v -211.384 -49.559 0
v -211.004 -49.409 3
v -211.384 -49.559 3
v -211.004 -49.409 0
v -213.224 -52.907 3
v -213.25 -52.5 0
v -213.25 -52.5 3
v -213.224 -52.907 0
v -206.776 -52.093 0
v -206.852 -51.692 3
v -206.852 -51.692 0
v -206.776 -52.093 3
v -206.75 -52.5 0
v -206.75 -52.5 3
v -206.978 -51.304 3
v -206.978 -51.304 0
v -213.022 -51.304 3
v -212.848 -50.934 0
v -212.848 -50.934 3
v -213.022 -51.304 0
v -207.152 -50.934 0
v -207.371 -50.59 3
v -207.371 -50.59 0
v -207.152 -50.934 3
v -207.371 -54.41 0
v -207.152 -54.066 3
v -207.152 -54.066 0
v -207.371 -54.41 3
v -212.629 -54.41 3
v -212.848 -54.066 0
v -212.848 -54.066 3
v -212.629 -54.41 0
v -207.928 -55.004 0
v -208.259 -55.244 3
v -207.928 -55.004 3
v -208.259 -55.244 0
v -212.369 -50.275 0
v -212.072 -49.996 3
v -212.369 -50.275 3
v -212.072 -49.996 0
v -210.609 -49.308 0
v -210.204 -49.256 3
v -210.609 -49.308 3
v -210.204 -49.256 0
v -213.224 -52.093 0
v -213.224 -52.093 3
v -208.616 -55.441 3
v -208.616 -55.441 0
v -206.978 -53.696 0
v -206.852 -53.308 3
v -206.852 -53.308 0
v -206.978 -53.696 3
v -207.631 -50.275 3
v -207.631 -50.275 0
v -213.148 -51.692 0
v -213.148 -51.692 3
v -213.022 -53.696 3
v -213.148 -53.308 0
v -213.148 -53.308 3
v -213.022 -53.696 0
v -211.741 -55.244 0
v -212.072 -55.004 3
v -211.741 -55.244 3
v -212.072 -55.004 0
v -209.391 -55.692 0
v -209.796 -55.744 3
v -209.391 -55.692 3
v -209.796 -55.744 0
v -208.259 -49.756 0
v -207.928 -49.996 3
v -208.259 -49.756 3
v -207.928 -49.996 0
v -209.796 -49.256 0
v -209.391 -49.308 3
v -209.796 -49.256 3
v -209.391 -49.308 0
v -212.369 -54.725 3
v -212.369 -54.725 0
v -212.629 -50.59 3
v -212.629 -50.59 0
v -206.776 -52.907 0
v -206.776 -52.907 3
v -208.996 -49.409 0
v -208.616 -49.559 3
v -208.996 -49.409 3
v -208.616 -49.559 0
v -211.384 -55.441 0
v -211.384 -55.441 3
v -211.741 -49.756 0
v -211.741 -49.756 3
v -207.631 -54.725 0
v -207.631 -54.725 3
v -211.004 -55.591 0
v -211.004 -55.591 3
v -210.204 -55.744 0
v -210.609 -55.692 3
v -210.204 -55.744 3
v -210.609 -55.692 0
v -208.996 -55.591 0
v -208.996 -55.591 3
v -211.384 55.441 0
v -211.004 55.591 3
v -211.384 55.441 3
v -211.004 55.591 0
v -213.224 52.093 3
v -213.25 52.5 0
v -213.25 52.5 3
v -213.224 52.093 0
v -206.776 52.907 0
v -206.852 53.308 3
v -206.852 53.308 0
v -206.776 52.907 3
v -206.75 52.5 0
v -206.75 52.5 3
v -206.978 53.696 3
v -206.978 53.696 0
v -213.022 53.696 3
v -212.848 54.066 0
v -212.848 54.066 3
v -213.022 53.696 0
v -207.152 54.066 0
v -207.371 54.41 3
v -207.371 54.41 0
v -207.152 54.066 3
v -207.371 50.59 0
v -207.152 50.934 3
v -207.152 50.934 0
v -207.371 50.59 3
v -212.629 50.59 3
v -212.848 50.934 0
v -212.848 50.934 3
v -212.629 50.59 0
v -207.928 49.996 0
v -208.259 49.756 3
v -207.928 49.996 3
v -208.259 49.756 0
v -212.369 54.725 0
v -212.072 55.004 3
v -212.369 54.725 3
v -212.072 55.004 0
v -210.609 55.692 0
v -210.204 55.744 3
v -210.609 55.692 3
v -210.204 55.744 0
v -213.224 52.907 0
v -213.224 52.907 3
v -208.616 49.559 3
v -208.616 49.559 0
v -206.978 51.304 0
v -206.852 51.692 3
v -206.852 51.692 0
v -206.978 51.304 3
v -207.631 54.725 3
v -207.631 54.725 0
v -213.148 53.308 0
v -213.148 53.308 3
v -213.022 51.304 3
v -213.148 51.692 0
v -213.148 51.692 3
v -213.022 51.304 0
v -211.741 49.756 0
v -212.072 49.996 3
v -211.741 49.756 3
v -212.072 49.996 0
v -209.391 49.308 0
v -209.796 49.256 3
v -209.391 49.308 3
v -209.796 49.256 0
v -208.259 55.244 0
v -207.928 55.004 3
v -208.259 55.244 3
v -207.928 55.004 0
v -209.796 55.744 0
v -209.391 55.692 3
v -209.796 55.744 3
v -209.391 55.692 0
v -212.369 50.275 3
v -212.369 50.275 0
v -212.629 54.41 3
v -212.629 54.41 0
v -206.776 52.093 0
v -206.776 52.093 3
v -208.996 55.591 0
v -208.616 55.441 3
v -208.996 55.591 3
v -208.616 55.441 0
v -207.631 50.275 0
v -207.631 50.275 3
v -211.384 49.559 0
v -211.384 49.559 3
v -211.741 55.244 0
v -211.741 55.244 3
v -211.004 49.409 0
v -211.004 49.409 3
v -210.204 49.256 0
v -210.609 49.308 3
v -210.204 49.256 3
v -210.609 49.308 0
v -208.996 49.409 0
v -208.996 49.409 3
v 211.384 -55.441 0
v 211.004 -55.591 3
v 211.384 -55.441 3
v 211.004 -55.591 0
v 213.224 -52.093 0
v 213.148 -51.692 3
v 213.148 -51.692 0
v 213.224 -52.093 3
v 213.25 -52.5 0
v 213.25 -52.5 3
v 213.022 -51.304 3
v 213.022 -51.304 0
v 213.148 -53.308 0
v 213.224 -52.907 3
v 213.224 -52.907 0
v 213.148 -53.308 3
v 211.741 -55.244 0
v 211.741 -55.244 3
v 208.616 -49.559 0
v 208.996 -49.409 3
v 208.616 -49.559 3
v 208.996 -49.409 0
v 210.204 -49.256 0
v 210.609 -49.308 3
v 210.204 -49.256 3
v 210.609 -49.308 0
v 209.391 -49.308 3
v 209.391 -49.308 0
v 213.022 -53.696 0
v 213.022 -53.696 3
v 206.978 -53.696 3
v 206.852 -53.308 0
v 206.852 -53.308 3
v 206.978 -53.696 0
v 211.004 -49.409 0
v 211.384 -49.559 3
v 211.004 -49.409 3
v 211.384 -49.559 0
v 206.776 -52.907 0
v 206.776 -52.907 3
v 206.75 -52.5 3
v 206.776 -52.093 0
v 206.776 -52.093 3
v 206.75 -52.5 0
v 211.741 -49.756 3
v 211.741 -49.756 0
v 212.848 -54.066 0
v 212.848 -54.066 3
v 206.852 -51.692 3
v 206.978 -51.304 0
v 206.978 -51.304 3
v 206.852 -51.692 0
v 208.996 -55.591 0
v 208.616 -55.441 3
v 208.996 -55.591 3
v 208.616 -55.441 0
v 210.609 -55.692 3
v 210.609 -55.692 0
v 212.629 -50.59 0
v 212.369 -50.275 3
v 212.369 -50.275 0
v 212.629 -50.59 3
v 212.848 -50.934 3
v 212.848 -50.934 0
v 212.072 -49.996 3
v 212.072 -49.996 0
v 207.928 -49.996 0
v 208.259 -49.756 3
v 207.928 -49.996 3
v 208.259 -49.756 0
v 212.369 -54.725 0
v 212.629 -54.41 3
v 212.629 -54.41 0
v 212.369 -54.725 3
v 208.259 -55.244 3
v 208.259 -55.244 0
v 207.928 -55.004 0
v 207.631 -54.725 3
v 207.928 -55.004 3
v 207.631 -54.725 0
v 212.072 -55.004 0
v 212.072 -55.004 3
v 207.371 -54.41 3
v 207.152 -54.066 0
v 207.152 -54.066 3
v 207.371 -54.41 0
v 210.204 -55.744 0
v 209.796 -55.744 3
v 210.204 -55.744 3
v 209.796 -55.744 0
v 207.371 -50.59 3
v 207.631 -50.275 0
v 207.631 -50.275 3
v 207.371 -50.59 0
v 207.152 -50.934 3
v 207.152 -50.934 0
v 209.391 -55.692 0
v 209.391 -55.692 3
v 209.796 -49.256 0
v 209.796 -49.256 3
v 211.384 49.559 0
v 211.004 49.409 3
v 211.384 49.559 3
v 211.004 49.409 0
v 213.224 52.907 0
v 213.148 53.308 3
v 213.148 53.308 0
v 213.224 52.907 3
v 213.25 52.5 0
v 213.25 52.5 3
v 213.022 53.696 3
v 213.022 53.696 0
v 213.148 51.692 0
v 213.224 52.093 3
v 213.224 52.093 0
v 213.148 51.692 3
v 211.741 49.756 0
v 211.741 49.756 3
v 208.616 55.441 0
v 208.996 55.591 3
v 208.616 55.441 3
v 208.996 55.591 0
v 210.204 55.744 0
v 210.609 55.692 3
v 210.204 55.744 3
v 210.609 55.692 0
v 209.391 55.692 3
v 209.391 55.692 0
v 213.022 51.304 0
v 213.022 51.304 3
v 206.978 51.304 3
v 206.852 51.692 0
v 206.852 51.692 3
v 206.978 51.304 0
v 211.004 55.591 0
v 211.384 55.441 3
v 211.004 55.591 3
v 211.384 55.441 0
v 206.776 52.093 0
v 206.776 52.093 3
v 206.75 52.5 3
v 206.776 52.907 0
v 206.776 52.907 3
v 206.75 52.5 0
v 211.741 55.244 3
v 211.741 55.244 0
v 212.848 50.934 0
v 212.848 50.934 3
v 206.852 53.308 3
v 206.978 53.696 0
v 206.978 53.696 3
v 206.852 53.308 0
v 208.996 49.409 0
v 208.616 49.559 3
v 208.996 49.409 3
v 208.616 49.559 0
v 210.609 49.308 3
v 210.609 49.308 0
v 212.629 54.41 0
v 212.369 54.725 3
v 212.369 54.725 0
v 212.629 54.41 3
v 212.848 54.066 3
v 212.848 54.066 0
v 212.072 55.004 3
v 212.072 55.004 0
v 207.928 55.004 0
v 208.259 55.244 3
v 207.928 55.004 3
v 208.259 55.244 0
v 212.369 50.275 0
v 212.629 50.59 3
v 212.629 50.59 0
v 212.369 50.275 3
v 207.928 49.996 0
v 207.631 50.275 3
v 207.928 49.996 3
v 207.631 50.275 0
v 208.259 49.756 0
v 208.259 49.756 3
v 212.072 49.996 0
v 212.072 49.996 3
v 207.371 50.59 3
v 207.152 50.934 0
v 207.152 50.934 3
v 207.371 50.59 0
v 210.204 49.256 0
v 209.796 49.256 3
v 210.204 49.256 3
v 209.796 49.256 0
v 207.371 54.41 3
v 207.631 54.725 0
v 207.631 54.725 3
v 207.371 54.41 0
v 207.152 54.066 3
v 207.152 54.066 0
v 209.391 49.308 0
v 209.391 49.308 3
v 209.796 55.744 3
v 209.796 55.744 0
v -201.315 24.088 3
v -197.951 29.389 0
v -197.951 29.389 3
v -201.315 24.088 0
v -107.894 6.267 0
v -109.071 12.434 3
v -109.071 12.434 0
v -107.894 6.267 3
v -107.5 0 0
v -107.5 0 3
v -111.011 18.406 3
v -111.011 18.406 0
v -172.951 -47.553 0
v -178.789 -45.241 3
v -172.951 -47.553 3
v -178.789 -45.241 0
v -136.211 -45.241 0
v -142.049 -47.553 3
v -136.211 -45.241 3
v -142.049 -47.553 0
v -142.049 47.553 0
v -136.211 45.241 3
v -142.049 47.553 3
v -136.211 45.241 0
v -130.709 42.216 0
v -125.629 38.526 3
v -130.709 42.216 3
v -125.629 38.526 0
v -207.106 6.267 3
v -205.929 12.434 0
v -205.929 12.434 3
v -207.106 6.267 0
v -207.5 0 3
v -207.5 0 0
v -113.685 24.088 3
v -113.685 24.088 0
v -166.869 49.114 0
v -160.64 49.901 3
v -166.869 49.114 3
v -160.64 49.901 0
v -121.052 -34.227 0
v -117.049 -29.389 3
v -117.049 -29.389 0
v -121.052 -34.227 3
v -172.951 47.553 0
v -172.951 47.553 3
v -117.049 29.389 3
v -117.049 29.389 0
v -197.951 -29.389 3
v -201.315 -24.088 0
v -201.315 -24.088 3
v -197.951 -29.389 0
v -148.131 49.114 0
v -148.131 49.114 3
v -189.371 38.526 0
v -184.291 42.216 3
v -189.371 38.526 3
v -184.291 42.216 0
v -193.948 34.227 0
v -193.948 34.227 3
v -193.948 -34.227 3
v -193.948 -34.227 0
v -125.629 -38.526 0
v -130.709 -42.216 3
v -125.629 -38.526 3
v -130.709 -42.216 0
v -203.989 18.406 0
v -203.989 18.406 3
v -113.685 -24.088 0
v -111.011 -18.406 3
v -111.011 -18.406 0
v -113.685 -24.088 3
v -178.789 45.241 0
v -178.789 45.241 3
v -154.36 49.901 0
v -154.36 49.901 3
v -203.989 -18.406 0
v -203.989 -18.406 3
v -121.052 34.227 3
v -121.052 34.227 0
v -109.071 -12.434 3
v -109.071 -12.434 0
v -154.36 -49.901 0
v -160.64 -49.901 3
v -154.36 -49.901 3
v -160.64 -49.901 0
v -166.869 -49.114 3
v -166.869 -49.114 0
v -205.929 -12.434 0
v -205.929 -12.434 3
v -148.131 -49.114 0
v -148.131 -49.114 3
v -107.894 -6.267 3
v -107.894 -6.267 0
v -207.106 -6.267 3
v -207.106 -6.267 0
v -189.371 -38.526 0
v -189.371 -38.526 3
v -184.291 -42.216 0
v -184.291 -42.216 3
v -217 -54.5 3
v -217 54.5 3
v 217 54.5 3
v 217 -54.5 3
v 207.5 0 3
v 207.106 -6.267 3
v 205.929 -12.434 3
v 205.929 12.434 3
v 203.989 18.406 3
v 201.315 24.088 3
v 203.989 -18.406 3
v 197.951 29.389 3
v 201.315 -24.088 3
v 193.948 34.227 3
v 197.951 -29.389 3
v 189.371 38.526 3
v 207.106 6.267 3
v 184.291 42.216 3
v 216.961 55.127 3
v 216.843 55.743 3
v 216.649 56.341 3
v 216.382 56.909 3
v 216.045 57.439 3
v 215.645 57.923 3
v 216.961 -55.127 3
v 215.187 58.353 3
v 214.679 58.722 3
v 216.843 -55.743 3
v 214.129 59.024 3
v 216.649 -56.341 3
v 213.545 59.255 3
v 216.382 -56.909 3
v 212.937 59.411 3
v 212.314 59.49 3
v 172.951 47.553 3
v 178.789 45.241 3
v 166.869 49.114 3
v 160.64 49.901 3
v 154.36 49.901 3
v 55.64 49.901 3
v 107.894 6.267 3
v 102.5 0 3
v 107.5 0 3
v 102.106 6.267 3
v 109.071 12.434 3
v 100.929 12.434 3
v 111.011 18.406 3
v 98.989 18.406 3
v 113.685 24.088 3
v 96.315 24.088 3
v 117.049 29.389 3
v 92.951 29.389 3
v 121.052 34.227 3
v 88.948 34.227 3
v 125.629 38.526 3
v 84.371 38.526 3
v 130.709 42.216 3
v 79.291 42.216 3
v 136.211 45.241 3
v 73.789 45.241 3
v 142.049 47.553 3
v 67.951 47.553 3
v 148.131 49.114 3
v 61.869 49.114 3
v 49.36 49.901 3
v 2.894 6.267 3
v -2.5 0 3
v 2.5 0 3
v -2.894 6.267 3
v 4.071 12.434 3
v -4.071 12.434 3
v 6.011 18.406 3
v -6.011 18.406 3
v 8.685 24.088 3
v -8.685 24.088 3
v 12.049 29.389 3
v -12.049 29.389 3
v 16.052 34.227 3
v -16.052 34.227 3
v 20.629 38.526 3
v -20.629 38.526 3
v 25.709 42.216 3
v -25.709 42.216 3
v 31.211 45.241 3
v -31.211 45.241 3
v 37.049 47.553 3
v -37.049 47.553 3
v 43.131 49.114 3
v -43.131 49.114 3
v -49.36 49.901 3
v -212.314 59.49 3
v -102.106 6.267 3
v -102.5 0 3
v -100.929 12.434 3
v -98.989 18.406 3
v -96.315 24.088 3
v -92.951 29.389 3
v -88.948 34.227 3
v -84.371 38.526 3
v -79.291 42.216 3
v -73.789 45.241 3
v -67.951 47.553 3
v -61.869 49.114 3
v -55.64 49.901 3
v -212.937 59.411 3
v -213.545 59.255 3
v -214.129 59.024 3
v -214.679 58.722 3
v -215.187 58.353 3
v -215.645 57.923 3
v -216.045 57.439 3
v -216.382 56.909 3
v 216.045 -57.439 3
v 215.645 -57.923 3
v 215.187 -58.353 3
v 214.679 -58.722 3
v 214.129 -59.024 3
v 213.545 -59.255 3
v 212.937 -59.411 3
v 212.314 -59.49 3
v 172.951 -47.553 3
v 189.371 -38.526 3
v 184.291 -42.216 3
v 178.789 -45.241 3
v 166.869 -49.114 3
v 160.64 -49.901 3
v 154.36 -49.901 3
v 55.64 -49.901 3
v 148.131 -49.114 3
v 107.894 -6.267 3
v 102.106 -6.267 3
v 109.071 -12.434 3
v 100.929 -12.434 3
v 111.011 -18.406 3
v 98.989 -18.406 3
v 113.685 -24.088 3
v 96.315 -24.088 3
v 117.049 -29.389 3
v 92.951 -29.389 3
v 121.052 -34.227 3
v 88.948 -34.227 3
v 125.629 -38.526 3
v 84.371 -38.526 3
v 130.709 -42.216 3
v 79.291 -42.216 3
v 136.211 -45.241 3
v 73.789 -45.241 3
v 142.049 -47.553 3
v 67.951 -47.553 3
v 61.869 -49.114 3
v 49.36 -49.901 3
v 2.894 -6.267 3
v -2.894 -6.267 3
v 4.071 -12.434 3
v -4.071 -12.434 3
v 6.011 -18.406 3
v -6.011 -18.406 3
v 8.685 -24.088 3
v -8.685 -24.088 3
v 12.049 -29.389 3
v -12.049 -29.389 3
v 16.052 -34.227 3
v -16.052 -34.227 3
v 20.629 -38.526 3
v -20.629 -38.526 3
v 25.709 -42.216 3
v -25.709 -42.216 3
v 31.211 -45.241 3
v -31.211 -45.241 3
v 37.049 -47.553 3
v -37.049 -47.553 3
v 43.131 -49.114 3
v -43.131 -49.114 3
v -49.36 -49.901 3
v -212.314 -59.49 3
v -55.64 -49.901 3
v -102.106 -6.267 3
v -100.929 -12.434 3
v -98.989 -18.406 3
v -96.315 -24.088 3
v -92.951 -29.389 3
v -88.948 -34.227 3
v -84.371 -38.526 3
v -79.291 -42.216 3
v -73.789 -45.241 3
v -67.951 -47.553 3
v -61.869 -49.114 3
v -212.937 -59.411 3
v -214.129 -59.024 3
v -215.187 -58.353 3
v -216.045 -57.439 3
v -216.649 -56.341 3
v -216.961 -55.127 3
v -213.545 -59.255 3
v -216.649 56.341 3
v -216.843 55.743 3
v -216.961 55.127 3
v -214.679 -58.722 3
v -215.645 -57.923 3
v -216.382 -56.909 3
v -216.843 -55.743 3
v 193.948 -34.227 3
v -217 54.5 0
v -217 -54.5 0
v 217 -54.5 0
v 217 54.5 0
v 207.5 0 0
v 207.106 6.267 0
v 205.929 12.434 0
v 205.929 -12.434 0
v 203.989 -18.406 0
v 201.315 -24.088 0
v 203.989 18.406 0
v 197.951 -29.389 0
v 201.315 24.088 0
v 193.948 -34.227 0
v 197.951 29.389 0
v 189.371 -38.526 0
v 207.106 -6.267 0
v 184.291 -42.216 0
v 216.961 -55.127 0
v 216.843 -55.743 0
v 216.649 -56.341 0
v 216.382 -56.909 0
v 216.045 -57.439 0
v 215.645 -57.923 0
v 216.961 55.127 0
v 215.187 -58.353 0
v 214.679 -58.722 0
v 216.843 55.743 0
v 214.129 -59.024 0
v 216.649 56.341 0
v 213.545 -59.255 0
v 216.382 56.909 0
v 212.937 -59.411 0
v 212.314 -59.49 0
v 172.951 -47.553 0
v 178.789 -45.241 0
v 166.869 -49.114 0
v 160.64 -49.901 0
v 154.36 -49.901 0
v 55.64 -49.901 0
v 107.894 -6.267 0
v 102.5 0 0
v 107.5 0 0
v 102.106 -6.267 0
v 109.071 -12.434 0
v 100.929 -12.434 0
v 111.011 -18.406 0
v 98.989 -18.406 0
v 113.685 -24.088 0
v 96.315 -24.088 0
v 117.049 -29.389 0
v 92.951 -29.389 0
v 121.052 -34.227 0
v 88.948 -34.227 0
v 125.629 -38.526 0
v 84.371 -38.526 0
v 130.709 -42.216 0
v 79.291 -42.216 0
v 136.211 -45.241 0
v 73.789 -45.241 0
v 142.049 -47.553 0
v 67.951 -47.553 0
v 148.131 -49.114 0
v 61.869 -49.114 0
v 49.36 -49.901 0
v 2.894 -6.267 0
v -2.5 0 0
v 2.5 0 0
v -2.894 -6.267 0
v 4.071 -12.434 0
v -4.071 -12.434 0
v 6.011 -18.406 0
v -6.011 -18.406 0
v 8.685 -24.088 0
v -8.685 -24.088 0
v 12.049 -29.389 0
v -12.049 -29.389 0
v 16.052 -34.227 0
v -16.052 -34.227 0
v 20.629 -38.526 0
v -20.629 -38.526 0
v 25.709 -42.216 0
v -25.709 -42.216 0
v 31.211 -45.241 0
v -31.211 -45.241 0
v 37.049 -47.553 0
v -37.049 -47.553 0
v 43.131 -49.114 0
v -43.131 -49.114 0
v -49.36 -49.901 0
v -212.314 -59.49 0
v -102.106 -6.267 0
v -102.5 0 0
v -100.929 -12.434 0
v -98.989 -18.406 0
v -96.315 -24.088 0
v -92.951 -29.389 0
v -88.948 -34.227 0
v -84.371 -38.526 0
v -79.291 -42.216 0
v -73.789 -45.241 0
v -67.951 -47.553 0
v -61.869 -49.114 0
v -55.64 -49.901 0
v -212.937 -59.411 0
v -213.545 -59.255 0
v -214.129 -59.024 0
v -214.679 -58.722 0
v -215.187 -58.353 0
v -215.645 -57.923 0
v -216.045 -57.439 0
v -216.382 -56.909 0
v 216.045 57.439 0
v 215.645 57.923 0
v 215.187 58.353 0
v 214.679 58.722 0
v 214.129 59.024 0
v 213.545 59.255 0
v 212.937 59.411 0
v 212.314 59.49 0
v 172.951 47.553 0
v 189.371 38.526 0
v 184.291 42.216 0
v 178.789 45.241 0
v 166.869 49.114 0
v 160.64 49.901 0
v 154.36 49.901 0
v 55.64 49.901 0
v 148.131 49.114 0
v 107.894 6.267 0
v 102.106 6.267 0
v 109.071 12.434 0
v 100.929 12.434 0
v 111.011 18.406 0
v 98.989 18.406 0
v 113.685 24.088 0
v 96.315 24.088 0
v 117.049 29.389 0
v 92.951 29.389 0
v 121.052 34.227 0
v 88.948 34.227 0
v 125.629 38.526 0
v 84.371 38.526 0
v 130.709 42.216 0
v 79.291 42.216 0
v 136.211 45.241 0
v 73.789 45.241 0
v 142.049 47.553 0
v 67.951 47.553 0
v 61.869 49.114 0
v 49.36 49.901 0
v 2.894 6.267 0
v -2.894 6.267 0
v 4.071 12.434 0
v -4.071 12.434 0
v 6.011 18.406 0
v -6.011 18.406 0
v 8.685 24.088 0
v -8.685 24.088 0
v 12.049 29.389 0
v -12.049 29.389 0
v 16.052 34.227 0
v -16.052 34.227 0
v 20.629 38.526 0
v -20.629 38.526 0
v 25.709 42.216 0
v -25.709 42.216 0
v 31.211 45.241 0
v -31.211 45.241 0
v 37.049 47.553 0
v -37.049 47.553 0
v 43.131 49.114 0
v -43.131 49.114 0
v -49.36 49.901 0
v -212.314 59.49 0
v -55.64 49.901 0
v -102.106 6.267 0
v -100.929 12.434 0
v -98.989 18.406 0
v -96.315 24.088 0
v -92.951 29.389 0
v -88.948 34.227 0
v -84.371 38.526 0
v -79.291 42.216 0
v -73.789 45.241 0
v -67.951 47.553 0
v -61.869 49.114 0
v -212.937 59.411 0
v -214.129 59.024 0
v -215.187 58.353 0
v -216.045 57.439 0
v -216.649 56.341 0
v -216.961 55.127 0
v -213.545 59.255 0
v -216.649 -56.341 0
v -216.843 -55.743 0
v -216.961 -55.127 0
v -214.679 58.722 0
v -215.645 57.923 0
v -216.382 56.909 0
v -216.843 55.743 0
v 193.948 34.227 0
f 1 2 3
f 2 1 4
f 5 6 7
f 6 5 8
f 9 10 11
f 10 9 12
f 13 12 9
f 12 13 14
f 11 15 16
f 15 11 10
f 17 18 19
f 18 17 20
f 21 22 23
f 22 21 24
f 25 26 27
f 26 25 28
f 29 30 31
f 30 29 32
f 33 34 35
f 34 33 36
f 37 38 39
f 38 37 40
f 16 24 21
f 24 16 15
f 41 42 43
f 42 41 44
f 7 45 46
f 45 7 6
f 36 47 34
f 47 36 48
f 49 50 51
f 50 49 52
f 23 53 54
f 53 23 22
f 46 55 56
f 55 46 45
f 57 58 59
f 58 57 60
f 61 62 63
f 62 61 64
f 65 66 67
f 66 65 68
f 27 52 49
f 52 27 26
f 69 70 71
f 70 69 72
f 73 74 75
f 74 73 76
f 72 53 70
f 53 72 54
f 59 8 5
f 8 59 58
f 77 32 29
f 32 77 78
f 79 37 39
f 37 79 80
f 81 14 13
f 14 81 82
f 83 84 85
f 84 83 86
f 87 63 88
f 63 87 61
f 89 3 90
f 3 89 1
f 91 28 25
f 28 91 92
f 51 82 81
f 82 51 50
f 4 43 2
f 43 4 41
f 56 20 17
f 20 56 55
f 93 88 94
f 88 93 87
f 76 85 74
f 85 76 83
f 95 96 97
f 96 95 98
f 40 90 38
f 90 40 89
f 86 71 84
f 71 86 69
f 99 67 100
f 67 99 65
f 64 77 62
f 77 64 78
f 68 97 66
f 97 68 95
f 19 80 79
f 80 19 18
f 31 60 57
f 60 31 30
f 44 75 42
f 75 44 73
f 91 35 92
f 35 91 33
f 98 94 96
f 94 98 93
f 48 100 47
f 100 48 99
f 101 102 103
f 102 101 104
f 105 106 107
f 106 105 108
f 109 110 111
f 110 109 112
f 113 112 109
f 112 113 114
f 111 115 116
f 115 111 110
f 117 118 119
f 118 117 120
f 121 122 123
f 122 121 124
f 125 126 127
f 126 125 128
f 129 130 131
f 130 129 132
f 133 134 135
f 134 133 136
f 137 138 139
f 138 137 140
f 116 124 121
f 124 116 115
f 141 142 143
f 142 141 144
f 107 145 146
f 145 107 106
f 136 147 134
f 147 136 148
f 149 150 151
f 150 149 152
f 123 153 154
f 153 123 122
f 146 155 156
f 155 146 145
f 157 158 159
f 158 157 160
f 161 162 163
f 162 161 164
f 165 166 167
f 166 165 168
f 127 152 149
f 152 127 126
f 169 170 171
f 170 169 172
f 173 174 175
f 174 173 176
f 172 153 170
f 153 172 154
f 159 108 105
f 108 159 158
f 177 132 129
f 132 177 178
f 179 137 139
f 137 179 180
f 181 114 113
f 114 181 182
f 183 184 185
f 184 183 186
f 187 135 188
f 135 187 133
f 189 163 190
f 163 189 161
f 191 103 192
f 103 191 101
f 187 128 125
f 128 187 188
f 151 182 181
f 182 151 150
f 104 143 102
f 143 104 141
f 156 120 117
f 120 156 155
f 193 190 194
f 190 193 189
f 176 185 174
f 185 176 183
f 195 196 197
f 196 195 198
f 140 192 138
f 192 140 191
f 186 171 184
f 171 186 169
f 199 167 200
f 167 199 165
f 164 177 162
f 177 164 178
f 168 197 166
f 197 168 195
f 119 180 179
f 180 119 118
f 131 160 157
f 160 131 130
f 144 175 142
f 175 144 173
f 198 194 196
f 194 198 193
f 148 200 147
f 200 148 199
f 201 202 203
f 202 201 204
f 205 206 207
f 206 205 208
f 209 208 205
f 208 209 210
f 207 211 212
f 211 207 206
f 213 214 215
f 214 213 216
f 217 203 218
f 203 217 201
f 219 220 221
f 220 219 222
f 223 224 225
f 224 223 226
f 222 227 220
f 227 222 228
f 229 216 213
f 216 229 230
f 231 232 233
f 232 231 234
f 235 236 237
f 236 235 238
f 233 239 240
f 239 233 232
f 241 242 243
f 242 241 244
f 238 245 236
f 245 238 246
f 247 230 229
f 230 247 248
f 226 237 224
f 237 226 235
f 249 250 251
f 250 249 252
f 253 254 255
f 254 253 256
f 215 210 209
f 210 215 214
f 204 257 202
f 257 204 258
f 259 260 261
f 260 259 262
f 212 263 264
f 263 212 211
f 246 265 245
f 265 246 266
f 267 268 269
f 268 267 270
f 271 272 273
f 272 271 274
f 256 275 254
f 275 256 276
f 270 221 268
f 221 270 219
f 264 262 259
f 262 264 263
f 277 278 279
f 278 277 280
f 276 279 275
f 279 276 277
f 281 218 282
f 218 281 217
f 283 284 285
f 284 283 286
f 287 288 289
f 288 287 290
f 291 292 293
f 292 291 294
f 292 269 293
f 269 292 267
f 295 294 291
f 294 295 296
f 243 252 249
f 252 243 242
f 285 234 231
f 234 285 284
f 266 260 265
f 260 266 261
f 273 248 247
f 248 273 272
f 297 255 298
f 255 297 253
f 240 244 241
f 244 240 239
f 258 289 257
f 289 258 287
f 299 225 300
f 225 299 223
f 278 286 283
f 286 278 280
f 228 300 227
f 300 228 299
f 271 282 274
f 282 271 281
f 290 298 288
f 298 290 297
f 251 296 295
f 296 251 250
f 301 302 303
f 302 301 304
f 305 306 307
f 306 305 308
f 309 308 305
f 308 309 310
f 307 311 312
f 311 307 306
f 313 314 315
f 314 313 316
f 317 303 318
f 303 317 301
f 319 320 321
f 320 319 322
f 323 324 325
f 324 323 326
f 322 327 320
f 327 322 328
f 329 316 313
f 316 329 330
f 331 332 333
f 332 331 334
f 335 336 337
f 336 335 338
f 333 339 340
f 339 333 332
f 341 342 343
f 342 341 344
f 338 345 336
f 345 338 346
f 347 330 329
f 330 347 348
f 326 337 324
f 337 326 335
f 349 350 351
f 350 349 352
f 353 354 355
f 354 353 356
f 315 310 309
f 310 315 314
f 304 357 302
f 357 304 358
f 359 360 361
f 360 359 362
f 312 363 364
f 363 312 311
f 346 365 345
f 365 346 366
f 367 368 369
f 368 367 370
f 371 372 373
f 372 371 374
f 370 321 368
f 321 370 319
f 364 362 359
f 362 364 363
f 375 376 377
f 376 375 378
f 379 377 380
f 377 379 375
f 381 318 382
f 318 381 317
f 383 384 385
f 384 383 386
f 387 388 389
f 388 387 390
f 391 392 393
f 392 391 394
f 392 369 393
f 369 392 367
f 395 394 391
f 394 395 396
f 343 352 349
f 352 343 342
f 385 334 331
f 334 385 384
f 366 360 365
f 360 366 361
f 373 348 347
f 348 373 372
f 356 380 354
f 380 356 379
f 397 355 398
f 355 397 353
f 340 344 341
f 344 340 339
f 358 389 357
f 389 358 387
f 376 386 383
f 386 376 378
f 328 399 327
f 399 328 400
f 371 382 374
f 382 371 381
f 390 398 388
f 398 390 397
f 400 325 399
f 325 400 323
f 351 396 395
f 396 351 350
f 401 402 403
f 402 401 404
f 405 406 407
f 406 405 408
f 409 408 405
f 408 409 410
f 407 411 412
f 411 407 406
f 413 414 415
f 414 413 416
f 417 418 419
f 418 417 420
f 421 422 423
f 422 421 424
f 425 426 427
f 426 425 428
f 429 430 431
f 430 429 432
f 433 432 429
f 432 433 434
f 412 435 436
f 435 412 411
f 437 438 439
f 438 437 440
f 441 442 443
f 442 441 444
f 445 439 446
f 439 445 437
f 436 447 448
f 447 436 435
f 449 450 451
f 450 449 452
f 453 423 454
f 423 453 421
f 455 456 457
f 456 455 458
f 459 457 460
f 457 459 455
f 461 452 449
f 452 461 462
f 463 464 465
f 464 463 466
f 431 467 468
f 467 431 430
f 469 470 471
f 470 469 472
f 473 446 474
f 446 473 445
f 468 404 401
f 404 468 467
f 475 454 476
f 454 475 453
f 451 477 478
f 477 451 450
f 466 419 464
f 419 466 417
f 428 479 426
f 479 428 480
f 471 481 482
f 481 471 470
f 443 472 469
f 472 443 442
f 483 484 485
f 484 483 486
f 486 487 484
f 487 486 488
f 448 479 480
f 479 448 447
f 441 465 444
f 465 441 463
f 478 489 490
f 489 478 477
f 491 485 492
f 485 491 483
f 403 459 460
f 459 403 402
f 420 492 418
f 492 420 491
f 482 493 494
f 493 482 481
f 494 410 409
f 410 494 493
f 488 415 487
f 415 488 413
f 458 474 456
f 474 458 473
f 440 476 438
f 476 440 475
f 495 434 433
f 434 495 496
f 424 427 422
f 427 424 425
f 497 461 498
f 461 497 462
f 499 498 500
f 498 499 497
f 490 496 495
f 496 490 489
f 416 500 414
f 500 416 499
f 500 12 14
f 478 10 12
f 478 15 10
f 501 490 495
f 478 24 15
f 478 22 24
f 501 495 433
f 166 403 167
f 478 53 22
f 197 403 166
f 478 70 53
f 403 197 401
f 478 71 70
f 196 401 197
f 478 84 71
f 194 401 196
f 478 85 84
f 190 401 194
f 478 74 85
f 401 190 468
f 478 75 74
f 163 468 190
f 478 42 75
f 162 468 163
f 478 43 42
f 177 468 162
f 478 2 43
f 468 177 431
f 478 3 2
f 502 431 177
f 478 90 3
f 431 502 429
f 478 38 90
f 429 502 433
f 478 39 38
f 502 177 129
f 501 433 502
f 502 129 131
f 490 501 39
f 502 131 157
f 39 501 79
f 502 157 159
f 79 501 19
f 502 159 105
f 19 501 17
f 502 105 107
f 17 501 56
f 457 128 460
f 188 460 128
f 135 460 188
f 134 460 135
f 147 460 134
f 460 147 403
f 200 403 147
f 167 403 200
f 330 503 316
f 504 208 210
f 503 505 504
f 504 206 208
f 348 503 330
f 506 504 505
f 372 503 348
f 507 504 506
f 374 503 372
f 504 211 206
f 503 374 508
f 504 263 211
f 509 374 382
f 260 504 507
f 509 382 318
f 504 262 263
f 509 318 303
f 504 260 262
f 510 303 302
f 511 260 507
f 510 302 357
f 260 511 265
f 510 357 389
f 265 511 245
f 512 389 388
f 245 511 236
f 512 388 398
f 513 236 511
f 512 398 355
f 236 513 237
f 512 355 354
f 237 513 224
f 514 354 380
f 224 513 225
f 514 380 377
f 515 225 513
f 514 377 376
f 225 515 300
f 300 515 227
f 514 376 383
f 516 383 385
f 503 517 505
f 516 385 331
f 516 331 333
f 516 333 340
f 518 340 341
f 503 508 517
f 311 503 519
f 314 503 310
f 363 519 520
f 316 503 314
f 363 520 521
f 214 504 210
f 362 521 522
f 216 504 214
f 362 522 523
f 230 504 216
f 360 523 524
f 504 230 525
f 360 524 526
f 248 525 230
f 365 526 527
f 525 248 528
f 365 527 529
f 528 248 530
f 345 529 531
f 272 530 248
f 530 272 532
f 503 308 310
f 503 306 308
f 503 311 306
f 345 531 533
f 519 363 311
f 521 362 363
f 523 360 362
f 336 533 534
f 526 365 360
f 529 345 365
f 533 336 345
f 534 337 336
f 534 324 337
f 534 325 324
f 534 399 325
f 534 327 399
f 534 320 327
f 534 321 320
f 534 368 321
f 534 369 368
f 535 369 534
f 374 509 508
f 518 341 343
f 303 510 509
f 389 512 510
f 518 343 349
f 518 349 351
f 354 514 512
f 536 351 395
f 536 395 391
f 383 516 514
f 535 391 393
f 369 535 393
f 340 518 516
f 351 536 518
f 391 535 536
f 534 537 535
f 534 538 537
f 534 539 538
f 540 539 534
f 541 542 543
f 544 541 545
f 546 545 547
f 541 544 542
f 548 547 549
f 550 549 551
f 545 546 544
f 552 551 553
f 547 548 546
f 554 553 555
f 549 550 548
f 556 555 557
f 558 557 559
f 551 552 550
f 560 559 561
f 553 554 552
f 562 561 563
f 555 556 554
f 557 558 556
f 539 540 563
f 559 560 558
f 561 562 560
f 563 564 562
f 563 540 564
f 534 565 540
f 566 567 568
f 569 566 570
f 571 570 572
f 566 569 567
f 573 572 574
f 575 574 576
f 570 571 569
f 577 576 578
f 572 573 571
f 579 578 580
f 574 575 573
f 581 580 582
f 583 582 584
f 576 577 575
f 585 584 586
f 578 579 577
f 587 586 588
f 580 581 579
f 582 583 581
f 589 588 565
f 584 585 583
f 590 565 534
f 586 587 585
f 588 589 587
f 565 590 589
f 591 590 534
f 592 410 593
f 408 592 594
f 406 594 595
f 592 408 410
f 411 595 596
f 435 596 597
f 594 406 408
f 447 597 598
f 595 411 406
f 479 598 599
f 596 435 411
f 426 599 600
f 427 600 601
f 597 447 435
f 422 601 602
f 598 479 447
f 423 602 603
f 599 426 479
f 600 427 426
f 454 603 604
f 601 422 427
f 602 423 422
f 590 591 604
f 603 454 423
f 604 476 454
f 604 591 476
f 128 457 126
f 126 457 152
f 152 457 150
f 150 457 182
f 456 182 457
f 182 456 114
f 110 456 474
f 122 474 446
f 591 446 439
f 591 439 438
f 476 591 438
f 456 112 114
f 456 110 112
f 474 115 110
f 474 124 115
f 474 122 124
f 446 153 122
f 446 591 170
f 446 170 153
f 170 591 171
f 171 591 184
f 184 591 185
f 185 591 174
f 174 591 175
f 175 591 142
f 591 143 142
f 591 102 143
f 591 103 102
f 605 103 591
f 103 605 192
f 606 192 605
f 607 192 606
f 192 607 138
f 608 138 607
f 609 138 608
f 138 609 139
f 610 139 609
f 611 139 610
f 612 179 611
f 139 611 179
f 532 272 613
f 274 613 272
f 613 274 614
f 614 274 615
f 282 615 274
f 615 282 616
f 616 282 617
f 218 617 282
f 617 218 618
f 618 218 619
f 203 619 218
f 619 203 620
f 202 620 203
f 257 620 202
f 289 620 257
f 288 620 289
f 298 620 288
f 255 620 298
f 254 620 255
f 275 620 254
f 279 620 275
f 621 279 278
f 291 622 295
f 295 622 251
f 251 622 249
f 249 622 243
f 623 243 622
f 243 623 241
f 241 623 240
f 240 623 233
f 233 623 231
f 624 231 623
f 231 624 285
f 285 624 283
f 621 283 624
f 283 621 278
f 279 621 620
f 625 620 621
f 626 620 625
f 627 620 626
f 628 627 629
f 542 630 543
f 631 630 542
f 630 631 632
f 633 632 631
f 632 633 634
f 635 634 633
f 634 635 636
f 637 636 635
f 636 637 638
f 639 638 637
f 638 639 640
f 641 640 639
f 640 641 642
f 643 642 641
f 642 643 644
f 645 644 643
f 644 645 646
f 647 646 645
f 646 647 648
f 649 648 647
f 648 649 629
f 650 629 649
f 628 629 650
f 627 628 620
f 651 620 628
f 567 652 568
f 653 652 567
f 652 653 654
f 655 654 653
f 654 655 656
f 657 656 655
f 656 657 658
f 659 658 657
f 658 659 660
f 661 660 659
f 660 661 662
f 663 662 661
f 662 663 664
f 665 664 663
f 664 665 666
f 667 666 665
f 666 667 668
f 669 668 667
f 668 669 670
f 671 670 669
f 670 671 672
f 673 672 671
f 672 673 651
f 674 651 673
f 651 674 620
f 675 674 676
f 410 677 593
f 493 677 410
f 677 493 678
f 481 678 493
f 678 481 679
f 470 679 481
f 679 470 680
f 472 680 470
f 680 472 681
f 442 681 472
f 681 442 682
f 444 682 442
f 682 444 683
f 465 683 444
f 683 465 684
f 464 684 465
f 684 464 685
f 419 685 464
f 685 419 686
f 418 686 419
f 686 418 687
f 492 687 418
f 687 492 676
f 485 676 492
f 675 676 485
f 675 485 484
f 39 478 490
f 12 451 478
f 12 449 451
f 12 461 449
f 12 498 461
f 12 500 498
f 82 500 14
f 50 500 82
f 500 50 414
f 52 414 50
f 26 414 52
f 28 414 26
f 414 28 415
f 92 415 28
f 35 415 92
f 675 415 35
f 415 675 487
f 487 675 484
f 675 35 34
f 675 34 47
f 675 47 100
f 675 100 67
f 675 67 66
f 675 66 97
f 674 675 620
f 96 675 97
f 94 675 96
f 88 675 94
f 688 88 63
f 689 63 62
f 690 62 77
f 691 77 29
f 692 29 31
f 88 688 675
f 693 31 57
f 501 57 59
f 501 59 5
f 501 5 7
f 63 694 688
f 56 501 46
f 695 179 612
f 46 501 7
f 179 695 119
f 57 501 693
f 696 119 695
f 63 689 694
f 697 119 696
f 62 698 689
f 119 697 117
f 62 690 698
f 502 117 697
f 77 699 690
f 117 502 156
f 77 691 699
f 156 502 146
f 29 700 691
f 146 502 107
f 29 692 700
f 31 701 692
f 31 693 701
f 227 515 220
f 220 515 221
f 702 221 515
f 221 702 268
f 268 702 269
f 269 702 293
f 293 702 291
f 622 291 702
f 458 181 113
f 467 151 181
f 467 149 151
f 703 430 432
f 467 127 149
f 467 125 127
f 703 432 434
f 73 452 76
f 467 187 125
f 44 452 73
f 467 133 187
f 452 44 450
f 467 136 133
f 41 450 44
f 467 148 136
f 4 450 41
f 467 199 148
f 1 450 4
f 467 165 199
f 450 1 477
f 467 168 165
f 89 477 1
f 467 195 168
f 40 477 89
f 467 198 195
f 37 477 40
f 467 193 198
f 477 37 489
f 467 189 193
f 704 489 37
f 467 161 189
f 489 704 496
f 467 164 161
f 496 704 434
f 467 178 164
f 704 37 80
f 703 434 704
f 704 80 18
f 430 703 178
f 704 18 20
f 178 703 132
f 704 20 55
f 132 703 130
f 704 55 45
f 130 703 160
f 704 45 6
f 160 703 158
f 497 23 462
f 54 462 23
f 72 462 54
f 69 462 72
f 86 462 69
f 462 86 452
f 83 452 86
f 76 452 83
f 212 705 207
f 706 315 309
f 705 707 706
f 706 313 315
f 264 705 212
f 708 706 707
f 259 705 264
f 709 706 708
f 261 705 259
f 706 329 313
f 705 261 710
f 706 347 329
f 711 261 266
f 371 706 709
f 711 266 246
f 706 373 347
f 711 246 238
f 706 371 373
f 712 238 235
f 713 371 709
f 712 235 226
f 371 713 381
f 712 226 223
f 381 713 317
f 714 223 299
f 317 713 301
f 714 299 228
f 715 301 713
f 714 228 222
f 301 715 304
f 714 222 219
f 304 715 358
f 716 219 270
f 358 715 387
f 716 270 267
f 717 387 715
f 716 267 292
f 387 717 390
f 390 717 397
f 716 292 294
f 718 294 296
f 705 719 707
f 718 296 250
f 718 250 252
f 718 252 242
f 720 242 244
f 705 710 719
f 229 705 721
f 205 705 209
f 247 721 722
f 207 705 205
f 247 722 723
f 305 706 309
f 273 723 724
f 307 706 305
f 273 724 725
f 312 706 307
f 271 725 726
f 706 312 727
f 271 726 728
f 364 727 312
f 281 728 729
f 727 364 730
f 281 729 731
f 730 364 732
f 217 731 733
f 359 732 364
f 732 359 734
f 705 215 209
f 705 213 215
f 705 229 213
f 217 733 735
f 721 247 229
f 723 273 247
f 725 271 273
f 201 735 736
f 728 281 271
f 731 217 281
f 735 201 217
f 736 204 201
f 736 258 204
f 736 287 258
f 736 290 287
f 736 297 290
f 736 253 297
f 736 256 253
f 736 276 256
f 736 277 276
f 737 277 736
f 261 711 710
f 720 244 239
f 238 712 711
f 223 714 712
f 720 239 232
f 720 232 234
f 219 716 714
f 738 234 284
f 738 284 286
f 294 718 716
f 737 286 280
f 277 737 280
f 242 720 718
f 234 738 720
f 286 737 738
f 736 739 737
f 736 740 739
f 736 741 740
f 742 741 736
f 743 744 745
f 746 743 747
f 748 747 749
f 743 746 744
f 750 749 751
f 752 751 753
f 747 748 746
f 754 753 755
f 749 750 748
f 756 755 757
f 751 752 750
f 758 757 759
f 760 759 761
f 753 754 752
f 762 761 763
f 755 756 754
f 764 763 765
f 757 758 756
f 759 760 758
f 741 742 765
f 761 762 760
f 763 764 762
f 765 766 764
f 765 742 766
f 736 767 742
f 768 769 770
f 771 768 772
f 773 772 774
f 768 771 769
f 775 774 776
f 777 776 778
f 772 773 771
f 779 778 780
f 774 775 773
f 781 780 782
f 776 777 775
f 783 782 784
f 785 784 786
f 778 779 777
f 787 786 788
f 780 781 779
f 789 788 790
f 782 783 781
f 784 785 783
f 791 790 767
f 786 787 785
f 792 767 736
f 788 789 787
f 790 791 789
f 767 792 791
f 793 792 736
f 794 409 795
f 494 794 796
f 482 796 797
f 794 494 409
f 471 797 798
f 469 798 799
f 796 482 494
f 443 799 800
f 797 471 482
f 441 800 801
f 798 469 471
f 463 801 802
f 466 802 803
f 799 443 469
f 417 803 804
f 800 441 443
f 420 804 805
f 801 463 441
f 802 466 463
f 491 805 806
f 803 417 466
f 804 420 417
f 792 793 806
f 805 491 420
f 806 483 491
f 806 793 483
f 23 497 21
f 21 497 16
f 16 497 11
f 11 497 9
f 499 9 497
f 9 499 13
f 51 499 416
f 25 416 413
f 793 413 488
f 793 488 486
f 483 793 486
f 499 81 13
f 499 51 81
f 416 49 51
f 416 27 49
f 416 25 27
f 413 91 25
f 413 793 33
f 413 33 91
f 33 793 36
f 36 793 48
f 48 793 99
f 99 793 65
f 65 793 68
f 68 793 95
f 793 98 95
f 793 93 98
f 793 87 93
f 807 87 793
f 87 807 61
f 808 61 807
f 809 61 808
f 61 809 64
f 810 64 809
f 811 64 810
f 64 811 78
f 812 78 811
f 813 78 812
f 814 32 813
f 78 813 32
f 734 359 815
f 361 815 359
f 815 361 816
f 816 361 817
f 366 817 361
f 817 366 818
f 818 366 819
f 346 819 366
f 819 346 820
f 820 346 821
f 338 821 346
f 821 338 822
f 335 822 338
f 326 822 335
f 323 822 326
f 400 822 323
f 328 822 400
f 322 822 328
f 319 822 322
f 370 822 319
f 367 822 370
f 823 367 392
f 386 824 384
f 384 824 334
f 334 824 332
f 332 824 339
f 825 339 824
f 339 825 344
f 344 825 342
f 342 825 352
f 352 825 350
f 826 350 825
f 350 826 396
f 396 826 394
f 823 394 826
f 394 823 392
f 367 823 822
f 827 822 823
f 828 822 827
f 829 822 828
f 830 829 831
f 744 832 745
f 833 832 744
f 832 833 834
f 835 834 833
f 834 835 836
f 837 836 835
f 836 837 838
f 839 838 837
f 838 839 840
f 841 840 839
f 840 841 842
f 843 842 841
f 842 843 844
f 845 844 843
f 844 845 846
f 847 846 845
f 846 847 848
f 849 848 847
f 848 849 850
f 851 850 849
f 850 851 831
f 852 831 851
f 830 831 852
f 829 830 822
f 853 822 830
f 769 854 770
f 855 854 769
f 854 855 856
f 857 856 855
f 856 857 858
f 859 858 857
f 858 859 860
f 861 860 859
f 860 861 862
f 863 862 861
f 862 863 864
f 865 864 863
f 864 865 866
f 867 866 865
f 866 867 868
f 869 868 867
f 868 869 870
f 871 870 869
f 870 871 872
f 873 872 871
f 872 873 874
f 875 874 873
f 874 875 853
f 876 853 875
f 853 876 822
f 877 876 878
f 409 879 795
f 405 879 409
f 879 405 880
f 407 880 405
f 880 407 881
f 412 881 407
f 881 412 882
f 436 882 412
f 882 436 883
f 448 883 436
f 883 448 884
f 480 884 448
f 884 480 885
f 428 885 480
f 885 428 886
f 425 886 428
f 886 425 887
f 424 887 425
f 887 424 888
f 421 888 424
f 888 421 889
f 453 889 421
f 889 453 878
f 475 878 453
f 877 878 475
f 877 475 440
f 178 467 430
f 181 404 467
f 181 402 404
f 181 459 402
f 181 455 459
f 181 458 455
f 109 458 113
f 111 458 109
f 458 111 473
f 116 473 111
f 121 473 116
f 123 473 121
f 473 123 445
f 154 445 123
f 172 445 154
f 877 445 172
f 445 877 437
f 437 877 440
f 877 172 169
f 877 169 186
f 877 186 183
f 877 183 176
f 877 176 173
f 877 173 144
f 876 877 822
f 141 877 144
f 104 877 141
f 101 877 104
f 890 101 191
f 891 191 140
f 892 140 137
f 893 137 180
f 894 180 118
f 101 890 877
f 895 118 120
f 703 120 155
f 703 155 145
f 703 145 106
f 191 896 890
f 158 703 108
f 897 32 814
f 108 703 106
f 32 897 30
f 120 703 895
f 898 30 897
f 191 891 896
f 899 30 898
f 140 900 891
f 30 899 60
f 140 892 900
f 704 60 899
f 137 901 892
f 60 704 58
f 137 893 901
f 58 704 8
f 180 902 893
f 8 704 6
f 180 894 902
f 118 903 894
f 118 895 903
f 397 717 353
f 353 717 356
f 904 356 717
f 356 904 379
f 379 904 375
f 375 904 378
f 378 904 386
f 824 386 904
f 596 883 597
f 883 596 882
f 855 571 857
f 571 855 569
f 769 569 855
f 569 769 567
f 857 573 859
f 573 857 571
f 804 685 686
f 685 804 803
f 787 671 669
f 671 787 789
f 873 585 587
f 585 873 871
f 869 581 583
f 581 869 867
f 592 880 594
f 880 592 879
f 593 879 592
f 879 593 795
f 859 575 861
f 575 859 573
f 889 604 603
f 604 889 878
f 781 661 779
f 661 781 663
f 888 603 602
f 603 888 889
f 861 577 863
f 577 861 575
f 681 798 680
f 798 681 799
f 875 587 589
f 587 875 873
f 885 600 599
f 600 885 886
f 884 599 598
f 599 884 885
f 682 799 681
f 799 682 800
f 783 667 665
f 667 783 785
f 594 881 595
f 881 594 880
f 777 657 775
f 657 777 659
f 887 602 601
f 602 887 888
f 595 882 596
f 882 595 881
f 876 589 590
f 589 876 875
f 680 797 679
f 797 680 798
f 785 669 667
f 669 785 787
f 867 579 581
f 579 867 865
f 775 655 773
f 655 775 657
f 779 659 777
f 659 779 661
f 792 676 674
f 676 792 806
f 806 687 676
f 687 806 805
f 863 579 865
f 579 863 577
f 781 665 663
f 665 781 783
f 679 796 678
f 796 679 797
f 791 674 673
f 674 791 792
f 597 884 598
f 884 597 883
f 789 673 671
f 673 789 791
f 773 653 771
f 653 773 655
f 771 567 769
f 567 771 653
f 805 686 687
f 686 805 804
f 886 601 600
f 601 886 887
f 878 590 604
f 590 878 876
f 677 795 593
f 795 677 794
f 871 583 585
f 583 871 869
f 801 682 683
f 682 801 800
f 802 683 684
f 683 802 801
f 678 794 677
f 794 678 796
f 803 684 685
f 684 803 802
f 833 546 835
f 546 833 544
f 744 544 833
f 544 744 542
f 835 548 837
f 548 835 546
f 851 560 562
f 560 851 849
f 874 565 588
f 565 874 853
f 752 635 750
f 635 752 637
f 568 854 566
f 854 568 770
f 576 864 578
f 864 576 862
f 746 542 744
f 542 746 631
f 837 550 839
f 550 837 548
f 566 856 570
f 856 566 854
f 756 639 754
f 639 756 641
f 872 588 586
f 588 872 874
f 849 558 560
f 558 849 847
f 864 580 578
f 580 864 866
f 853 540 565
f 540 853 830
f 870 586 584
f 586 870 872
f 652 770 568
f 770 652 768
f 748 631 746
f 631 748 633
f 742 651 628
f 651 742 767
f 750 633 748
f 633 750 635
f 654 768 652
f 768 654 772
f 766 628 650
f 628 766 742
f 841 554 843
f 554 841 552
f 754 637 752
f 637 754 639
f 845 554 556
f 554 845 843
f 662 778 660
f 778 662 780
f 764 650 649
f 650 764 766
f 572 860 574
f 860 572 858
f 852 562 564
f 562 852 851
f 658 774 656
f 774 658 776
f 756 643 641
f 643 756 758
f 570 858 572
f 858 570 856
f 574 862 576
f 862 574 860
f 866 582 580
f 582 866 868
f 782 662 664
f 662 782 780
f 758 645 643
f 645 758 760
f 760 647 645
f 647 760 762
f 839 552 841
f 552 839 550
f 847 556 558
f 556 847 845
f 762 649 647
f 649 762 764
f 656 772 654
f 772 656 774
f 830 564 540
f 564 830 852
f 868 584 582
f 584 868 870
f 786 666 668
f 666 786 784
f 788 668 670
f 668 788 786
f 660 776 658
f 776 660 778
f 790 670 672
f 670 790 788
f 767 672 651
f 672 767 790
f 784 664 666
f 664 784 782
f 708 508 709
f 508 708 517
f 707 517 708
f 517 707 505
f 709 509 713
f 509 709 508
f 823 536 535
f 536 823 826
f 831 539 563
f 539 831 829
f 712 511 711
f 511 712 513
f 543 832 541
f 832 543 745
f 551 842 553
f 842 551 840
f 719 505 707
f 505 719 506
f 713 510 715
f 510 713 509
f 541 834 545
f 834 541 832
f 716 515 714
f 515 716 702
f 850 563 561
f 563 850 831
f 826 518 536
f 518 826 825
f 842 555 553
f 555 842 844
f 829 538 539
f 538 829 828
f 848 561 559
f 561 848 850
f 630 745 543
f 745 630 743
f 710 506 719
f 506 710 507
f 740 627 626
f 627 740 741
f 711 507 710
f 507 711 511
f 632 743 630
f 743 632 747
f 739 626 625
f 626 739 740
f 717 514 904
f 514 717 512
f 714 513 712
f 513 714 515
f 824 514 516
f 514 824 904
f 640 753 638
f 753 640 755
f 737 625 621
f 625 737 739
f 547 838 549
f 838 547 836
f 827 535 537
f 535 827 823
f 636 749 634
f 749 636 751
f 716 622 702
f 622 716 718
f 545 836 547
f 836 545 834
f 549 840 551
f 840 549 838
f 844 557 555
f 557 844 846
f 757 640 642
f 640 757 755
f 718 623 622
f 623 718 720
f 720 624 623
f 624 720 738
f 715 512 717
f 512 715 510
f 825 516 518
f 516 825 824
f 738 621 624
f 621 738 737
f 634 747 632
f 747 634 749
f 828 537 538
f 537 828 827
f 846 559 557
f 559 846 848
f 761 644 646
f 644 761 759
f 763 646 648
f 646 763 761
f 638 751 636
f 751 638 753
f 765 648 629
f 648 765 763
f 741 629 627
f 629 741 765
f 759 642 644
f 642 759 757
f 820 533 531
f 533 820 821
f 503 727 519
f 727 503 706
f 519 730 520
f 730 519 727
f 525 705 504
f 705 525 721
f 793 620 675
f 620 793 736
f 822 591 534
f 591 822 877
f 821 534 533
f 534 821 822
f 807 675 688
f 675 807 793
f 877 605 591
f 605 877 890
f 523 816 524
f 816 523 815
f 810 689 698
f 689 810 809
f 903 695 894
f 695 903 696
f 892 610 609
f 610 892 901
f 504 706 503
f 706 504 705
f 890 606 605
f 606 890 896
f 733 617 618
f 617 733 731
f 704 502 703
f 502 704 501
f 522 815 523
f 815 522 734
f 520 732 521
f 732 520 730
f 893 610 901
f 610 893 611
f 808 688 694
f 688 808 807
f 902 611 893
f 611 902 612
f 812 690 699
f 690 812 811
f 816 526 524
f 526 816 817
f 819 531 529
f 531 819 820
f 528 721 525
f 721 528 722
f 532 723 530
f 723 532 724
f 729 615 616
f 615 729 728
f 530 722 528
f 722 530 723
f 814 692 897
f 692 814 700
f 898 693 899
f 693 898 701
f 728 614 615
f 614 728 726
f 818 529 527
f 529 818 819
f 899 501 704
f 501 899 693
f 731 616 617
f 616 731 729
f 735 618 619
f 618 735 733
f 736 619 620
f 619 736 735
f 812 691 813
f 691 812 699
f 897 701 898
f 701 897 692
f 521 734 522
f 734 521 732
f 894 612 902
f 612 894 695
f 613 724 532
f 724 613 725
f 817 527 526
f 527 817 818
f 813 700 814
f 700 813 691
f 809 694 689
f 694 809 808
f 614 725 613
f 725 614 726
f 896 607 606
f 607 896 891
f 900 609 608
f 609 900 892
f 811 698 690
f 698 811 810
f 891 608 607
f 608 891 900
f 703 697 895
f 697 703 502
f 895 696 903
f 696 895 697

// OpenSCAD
$fn = 50;

difference() {
	union() {
		hull() {
			translate(v = [-212.0, 54.5, 0]) {
				cylinder(h = 3, r = 5);
			}
			translate(v = [212.0, 54.5, 0]) {
				cylinder(h = 3, r = 5);
			}
			translate(v = [-212.0, -54.5, 0]) {
				cylinder(h = 3, r = 5);
			}
			translate(v = [212.0, -54.5, 0]) {
				cylinder(h = 3, r = 5);
			}
		}
	}
	union() {
		translate(v = [-210.0, -52.5, -100.0]) {
			cylinder(h = 200, r = 3.25);
		}
		translate(v = [-210.0, 52.5, -100.0]) {
			cylinder(h = 200, r = 3.25);
		}
		translate(v = [210.0, -52.5, -100.0]) {
			cylinder(h = 200, r = 3.25);
		}
		translate(v = [210.0, 52.5, -100.0]) {
			cylinder(h = 200, r = 3.25);
		}
		translate(v = [-210.0, -52.5, -100.0]) {
			cylinder(h = 200, r = 1.8);
		}
		translate(v = [-210.0, 52.5, -100.0]) {
			cylinder(h = 200, r = 1.8);
		}
		translate(v = [210.0, -52.5, -100.0]) {
			cylinder(h = 200, r = 1.8);
		}
		translate(v = [210.0, 52.5, -100.0]) {
			cylinder(h = 200, r = 1.8);
		}
		translate(v = [-157.5, 0, 0.0]) {
			cylinder(h = 3, r = 50.0);
		}
		translate(v = [-52.5, 0, 0.0]) {
			cylinder(h = 3, r = 50.0);
		}
		translate(v = [52.5, 0, 0.0]) {
			cylinder(h = 3, r = 50.0);
		}
		translate(v = [157.5, 0, 0.0]) {
			cylinder(h = 3, r = 50.0);
		}
	}
}
